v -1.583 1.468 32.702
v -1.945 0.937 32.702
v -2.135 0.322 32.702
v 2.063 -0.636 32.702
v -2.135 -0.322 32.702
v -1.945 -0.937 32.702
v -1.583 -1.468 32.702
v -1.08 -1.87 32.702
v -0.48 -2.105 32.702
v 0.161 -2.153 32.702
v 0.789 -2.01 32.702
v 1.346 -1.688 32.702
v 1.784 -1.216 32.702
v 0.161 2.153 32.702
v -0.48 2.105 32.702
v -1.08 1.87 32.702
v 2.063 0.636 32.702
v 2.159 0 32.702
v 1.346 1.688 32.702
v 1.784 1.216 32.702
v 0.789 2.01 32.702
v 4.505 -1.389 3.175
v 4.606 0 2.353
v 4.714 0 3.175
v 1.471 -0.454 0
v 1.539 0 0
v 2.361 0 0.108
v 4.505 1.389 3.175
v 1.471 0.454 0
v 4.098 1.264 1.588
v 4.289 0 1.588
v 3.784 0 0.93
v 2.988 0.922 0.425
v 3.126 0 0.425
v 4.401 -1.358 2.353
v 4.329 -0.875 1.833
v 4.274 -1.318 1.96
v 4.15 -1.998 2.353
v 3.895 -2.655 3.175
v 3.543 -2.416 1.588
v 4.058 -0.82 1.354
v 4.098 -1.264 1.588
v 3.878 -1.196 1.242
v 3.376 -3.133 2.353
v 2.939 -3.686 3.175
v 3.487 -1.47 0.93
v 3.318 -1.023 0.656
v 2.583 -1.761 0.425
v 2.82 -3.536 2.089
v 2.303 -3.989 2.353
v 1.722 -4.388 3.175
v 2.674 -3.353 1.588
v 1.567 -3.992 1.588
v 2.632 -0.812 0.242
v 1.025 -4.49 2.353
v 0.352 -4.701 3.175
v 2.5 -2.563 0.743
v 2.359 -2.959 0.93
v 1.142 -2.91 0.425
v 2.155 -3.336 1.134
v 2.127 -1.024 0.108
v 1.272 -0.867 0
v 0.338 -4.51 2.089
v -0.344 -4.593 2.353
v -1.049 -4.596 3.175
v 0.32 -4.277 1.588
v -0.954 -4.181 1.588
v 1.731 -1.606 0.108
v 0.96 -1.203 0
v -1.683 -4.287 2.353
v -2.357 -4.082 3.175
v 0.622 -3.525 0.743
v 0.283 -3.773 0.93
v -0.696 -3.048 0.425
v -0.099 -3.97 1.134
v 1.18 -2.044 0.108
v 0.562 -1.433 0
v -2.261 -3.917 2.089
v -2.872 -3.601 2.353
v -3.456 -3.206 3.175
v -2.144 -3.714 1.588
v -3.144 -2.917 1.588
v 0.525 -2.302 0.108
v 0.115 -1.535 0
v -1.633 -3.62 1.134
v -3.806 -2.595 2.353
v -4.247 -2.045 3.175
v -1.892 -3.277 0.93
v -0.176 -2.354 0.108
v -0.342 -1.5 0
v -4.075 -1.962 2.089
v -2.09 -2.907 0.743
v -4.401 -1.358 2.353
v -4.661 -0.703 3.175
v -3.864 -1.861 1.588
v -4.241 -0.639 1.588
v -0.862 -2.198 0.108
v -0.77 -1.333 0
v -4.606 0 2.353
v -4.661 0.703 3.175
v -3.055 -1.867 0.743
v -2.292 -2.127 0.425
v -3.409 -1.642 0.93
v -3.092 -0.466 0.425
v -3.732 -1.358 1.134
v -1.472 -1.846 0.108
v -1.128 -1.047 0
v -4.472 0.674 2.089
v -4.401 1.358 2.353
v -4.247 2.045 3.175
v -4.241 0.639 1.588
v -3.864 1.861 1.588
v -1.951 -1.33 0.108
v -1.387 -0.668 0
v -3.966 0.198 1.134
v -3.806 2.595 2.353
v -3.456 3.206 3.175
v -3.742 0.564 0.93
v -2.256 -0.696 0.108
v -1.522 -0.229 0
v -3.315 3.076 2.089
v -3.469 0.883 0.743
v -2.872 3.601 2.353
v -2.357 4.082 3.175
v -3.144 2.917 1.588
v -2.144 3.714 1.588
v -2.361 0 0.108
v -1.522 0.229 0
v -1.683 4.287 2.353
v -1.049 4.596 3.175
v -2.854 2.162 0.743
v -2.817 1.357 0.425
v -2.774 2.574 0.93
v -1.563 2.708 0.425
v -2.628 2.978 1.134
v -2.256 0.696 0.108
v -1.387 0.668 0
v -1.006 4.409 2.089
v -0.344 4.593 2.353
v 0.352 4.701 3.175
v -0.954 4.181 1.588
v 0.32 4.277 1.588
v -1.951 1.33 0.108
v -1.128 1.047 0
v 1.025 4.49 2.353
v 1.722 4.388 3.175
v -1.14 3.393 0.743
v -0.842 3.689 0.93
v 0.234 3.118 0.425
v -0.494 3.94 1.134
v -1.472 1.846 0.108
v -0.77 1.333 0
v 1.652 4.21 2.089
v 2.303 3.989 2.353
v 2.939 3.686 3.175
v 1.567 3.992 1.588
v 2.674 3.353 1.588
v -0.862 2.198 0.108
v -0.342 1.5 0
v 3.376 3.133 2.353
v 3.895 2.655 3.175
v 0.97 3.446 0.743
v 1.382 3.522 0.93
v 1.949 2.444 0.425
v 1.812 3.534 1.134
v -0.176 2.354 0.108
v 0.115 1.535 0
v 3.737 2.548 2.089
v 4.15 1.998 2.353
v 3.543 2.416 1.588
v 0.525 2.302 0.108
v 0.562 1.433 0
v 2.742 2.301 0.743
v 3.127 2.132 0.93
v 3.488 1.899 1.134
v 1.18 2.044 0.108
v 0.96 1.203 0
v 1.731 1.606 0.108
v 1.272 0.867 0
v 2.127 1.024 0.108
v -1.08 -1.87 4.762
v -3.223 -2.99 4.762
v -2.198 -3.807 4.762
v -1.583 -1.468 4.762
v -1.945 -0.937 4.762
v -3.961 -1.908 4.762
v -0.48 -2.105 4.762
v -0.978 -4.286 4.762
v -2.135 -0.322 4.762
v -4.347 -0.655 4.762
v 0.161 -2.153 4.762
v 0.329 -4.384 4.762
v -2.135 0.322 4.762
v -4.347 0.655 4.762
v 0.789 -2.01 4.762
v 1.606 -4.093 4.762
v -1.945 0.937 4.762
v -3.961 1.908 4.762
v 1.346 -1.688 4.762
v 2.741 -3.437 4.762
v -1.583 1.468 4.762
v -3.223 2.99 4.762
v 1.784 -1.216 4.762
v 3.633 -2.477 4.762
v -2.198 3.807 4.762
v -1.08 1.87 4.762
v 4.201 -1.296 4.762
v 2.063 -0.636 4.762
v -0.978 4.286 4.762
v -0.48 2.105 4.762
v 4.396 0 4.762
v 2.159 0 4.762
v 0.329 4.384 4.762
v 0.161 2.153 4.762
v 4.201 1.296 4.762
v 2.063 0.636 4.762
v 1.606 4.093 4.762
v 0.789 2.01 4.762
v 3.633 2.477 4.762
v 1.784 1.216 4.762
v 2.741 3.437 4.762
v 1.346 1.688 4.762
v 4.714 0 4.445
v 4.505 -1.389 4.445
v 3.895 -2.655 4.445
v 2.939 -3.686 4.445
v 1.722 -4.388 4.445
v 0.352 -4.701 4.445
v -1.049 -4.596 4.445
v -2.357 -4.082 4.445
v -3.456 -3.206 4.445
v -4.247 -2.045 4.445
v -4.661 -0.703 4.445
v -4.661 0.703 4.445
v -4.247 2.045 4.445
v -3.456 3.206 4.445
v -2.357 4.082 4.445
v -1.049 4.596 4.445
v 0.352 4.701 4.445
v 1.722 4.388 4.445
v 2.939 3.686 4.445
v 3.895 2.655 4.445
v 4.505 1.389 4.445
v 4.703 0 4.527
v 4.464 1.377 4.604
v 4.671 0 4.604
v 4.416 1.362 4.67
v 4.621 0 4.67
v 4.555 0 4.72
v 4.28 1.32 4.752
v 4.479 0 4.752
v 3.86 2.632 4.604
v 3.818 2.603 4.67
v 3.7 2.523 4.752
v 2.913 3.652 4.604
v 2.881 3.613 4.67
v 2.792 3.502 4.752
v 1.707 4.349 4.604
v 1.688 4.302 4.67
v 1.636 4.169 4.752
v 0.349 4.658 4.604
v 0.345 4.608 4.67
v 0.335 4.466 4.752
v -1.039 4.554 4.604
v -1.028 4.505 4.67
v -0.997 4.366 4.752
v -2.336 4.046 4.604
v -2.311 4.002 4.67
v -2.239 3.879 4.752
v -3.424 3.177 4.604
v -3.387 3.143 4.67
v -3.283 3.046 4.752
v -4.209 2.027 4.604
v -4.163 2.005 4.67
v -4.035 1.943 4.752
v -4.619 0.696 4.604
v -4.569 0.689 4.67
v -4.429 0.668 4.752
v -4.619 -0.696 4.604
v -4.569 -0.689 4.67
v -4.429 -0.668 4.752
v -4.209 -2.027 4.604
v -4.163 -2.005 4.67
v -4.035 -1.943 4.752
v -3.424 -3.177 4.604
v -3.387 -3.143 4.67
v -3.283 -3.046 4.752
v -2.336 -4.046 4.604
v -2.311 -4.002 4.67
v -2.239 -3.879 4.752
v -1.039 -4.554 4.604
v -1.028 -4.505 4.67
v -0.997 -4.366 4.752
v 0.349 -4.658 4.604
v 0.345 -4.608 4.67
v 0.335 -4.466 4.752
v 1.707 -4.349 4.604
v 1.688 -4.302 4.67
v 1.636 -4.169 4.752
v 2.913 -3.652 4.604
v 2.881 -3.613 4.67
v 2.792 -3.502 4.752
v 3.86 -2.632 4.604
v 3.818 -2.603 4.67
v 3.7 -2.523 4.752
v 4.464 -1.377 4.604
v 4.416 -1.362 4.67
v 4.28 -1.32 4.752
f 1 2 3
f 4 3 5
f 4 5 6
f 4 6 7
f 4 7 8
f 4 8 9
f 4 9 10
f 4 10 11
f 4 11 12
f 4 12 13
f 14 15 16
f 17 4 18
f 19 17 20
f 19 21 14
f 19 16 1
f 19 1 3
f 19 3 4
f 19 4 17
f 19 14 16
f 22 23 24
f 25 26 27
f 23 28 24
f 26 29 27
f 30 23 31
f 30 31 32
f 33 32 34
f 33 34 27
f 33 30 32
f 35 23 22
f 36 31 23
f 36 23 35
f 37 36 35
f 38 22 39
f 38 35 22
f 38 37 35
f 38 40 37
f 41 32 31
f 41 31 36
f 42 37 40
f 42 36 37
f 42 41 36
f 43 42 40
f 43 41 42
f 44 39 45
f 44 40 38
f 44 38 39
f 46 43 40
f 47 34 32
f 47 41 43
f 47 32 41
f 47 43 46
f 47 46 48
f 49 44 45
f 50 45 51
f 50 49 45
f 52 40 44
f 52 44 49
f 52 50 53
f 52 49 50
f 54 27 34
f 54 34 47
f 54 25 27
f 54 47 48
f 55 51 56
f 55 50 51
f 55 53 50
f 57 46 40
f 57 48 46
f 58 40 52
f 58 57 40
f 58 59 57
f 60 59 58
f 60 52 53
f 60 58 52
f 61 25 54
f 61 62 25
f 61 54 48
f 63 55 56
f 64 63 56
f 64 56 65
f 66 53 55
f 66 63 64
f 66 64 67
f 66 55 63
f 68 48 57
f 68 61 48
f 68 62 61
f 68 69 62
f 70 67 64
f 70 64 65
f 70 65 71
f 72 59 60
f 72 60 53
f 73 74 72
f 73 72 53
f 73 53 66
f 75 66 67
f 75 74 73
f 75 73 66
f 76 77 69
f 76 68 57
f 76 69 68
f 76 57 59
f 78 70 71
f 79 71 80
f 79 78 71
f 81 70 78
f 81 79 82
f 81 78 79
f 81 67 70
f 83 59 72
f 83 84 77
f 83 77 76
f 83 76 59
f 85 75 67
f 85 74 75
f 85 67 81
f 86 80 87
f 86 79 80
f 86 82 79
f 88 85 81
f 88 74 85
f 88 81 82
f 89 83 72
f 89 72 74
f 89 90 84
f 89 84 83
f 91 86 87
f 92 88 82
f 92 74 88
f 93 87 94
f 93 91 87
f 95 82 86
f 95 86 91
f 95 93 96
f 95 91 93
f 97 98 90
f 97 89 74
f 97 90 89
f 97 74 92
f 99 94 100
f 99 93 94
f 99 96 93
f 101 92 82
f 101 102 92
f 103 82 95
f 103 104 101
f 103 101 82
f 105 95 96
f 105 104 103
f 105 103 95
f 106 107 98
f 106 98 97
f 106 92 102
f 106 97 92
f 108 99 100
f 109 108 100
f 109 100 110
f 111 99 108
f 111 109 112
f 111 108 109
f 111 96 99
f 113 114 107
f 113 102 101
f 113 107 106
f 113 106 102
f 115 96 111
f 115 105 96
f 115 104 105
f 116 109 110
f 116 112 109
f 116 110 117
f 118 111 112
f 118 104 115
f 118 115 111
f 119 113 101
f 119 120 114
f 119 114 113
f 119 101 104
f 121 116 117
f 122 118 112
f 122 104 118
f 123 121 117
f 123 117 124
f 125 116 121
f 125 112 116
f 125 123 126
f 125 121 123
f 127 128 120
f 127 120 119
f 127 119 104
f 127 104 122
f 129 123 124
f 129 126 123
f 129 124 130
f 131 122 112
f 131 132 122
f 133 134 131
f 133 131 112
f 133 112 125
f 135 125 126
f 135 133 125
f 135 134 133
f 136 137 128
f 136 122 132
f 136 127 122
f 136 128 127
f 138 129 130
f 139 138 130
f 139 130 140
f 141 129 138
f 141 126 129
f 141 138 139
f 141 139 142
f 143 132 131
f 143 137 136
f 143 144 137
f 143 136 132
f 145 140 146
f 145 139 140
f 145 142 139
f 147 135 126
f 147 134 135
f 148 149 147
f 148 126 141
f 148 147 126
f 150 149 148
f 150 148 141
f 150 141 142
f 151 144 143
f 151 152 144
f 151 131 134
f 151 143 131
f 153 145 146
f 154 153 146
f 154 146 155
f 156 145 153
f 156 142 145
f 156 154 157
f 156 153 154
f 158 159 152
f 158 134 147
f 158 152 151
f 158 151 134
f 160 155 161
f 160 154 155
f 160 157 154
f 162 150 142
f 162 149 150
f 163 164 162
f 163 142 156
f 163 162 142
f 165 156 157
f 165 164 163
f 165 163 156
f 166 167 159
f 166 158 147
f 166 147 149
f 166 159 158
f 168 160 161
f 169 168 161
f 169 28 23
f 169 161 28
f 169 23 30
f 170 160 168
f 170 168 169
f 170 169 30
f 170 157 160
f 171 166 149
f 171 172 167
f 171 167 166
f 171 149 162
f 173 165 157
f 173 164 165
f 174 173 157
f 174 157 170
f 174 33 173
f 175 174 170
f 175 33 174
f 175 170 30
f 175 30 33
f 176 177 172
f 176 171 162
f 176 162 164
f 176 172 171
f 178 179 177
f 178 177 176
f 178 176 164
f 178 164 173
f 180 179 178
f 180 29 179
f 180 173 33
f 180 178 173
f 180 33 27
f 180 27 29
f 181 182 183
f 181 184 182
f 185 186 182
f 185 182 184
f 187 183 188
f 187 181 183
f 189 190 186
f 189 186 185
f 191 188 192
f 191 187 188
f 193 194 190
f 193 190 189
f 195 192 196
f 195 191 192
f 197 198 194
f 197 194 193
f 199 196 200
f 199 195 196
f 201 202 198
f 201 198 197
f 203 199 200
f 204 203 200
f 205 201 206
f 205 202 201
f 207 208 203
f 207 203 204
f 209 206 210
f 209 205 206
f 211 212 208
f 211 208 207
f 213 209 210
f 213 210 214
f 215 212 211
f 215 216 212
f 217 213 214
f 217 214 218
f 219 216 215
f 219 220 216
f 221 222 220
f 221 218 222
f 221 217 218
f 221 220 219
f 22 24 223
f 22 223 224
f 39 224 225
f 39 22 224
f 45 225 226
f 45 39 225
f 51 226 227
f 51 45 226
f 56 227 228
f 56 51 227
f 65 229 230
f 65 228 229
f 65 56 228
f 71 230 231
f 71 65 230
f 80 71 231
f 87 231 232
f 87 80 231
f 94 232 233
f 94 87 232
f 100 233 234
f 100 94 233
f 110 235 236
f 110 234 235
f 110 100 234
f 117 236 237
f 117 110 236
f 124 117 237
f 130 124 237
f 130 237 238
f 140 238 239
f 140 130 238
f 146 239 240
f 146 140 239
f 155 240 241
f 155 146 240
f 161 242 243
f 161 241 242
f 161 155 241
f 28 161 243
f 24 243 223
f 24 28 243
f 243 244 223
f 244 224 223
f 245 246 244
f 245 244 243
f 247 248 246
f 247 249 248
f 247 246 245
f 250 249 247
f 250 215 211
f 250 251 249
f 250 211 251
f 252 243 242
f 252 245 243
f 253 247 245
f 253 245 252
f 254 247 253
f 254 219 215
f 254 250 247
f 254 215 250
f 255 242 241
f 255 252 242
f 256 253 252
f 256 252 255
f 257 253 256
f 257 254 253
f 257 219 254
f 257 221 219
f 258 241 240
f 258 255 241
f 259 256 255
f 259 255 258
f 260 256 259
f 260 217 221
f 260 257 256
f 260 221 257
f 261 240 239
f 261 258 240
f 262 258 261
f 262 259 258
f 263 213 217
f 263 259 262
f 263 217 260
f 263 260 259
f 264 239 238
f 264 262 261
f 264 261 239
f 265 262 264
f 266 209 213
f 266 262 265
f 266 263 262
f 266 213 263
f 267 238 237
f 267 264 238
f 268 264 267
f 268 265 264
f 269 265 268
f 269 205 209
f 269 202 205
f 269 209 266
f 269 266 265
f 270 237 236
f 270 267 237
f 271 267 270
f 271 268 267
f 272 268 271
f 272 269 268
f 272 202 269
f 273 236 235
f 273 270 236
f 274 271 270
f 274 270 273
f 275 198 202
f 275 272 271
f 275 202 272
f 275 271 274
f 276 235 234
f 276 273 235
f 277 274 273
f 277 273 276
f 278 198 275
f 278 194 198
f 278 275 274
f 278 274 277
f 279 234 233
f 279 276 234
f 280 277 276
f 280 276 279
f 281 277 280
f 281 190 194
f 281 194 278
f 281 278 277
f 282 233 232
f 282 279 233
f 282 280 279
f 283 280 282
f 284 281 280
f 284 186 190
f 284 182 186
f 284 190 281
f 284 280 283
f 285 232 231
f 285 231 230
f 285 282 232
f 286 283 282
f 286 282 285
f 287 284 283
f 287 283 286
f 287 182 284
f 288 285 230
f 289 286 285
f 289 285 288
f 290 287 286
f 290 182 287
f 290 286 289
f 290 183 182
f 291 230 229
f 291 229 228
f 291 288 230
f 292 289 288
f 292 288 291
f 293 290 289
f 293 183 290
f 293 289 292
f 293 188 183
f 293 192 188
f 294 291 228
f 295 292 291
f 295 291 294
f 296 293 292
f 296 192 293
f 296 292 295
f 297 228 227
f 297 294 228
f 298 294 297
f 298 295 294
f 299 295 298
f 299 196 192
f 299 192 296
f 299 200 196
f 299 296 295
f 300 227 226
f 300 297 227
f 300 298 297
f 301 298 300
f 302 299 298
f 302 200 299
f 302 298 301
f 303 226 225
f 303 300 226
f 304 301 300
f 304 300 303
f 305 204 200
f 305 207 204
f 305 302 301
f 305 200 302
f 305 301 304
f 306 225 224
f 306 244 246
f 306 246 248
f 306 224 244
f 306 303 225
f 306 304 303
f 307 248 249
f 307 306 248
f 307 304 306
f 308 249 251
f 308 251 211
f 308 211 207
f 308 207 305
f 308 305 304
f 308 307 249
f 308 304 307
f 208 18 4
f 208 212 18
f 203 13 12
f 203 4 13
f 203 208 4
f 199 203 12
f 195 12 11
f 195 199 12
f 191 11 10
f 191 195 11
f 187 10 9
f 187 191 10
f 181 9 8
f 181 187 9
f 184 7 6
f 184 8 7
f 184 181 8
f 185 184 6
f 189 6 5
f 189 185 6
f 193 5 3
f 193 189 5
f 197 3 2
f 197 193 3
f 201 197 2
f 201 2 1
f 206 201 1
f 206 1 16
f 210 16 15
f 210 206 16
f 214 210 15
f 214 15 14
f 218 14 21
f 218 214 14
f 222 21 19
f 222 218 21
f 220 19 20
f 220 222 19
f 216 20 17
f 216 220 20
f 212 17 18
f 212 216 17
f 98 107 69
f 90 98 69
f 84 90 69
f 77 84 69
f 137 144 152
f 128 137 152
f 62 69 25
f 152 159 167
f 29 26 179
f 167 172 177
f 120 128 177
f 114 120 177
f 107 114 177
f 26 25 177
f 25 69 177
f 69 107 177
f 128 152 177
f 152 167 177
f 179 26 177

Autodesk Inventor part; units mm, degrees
ref_plane "YZ Plane" through (0, 0, 0) normal (1, 0, 0) x (0, 1, 0)
ref_plane "XZ Plane" through (0, 0, 0) normal (0, 1, 0) x (-1, 0, 0)
ref_plane "XY Plane" through (0, 0, 0) normal (0, 0, 1) x (1, 0, 0)
sketch "Sketch1" plane through (0, 0, 0) normal (0, 0, 1) x (1, 0, 0)
  circle A0 centre (0, 0) radius 4.714
extrude "Extrusion1" add sketch "Sketch1" along normal blind 4.7625
fillet "Fillet1" radius 3.175 1 edges at (-4.714, 0, 0)
fillet "Fillet2" radius 0.3175 1 edges at (-4.714, 0, 4.7625)
sketch "Sketch2" plane through (0, 0, 4.7625) normal (0, 0, 1) x (1, 0, 0)
  circle A0 centre (0, 0) radius 1.539 projected
  circle A1 centre (0, 0) radius 2.159
  dimension "d4" = 4.318
extrude "Extrusion2" add sketch "Sketch2" along normal blind 27.94 contours A0 | A1
thread "Thread1" size "10-24 UNC" class "2A" standard "ANSI Unified Screw Threads" full length
properties part number "Bolt"
